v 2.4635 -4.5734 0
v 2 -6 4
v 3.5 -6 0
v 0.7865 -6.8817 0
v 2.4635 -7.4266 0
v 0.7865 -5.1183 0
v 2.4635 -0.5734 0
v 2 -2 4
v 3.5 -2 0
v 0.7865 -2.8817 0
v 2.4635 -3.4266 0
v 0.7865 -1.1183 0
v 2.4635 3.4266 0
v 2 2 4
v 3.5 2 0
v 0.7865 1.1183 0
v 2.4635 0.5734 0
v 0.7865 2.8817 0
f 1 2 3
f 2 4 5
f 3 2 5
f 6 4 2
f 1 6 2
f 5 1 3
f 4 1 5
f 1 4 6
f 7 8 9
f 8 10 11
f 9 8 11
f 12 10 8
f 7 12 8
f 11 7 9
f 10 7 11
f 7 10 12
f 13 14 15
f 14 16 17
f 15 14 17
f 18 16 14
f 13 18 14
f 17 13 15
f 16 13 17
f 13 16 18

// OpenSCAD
union() {
	translate([2, -6, 0]) cylinder(r1=1.5, r2=0, h=4);
	translate([2, -2, 0]) cylinder(r1=1.5, r2=0, h=4);
	translate([2, 2, 0]) cylinder(r1=1.5, r2=0, h=4);
}
